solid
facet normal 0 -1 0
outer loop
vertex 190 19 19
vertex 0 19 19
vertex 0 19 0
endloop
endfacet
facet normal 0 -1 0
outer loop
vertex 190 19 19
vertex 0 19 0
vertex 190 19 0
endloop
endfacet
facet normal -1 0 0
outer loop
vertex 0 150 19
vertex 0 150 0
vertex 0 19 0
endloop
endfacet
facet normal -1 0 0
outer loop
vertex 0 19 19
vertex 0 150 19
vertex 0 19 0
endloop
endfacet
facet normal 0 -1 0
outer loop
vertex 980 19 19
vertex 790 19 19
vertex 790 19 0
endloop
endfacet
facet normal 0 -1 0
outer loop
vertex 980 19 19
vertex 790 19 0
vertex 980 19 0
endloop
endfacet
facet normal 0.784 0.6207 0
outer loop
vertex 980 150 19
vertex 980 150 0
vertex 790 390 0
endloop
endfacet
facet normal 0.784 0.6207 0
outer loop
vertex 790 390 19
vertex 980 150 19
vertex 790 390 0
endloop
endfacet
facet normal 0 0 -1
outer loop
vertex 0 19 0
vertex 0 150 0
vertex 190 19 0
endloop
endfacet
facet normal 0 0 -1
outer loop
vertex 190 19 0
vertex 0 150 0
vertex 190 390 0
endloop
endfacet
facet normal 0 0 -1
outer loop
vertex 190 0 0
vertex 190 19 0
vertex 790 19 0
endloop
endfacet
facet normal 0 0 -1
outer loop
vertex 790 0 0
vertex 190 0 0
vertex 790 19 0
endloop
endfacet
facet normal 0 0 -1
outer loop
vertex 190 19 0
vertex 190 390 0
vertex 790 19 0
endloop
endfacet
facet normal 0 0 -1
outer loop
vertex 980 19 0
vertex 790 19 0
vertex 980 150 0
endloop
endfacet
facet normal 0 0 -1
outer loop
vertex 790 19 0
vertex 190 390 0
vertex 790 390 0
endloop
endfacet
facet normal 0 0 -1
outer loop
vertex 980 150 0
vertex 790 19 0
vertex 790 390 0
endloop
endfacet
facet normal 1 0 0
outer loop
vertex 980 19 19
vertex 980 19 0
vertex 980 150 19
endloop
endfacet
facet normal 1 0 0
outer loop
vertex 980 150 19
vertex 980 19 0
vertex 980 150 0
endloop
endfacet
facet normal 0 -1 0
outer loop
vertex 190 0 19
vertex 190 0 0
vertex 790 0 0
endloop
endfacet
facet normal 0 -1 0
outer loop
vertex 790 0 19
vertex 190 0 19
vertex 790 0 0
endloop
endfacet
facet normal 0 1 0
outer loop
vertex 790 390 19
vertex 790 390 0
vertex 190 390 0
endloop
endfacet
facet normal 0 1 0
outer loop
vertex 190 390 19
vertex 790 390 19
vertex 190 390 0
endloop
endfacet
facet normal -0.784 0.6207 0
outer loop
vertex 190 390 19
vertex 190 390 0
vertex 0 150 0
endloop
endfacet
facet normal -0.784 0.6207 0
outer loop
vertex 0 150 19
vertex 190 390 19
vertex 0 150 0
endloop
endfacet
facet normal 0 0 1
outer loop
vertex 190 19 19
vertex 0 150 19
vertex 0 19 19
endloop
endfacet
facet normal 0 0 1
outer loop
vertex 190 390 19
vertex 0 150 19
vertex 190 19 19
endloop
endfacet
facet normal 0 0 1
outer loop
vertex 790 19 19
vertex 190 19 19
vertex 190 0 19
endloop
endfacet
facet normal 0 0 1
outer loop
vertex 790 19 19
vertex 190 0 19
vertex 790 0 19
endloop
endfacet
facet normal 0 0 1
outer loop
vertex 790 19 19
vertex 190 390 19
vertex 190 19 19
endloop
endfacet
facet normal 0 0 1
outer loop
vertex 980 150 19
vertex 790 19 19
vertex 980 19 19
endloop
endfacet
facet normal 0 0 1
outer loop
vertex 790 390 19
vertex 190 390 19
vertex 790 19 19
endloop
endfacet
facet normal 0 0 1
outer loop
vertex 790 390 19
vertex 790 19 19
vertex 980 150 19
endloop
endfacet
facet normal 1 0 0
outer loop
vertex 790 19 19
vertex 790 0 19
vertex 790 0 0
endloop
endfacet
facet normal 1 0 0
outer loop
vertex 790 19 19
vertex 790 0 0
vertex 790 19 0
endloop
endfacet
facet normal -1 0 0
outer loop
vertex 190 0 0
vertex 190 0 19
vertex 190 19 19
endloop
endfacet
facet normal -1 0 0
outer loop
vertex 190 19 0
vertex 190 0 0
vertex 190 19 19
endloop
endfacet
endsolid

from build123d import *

# Parameters (mm, degrees)
F1_DEPTH = 19
F2_W     = 190
F2_H     = 19
F3_DEPTH = 19
F4_W     = 190
F4_H     = 19
F5_DEPTH = 19


with BuildPart() as f1:
    # F0 (on Top) → F1 (new body)
    with BuildSketch(Plane.XY):
        Polygon((0, 150), (0, 0), (980, 0), (980, 150), (790, 390), (190, 390), align=None)
    extrude(amount=F1_DEPTH)

    # F2 (on face) → F3 (cut)
    with BuildSketch(Plane.XY.offset(19)):
        with Locations((95, 9.5)):
            Rectangle(F2_W, F2_H)
    extrude(amount=-F3_DEPTH, mode=Mode.SUBTRACT)

    # F4 (on face) → F5 (cut)
    with BuildSketch(Plane.XY.offset(19)):
        with Locations((885, 9.5)):
            Rectangle(F4_W, F4_H)
    extrude(amount=-F5_DEPTH, mode=Mode.SUBTRACT)


solid = f1.part
